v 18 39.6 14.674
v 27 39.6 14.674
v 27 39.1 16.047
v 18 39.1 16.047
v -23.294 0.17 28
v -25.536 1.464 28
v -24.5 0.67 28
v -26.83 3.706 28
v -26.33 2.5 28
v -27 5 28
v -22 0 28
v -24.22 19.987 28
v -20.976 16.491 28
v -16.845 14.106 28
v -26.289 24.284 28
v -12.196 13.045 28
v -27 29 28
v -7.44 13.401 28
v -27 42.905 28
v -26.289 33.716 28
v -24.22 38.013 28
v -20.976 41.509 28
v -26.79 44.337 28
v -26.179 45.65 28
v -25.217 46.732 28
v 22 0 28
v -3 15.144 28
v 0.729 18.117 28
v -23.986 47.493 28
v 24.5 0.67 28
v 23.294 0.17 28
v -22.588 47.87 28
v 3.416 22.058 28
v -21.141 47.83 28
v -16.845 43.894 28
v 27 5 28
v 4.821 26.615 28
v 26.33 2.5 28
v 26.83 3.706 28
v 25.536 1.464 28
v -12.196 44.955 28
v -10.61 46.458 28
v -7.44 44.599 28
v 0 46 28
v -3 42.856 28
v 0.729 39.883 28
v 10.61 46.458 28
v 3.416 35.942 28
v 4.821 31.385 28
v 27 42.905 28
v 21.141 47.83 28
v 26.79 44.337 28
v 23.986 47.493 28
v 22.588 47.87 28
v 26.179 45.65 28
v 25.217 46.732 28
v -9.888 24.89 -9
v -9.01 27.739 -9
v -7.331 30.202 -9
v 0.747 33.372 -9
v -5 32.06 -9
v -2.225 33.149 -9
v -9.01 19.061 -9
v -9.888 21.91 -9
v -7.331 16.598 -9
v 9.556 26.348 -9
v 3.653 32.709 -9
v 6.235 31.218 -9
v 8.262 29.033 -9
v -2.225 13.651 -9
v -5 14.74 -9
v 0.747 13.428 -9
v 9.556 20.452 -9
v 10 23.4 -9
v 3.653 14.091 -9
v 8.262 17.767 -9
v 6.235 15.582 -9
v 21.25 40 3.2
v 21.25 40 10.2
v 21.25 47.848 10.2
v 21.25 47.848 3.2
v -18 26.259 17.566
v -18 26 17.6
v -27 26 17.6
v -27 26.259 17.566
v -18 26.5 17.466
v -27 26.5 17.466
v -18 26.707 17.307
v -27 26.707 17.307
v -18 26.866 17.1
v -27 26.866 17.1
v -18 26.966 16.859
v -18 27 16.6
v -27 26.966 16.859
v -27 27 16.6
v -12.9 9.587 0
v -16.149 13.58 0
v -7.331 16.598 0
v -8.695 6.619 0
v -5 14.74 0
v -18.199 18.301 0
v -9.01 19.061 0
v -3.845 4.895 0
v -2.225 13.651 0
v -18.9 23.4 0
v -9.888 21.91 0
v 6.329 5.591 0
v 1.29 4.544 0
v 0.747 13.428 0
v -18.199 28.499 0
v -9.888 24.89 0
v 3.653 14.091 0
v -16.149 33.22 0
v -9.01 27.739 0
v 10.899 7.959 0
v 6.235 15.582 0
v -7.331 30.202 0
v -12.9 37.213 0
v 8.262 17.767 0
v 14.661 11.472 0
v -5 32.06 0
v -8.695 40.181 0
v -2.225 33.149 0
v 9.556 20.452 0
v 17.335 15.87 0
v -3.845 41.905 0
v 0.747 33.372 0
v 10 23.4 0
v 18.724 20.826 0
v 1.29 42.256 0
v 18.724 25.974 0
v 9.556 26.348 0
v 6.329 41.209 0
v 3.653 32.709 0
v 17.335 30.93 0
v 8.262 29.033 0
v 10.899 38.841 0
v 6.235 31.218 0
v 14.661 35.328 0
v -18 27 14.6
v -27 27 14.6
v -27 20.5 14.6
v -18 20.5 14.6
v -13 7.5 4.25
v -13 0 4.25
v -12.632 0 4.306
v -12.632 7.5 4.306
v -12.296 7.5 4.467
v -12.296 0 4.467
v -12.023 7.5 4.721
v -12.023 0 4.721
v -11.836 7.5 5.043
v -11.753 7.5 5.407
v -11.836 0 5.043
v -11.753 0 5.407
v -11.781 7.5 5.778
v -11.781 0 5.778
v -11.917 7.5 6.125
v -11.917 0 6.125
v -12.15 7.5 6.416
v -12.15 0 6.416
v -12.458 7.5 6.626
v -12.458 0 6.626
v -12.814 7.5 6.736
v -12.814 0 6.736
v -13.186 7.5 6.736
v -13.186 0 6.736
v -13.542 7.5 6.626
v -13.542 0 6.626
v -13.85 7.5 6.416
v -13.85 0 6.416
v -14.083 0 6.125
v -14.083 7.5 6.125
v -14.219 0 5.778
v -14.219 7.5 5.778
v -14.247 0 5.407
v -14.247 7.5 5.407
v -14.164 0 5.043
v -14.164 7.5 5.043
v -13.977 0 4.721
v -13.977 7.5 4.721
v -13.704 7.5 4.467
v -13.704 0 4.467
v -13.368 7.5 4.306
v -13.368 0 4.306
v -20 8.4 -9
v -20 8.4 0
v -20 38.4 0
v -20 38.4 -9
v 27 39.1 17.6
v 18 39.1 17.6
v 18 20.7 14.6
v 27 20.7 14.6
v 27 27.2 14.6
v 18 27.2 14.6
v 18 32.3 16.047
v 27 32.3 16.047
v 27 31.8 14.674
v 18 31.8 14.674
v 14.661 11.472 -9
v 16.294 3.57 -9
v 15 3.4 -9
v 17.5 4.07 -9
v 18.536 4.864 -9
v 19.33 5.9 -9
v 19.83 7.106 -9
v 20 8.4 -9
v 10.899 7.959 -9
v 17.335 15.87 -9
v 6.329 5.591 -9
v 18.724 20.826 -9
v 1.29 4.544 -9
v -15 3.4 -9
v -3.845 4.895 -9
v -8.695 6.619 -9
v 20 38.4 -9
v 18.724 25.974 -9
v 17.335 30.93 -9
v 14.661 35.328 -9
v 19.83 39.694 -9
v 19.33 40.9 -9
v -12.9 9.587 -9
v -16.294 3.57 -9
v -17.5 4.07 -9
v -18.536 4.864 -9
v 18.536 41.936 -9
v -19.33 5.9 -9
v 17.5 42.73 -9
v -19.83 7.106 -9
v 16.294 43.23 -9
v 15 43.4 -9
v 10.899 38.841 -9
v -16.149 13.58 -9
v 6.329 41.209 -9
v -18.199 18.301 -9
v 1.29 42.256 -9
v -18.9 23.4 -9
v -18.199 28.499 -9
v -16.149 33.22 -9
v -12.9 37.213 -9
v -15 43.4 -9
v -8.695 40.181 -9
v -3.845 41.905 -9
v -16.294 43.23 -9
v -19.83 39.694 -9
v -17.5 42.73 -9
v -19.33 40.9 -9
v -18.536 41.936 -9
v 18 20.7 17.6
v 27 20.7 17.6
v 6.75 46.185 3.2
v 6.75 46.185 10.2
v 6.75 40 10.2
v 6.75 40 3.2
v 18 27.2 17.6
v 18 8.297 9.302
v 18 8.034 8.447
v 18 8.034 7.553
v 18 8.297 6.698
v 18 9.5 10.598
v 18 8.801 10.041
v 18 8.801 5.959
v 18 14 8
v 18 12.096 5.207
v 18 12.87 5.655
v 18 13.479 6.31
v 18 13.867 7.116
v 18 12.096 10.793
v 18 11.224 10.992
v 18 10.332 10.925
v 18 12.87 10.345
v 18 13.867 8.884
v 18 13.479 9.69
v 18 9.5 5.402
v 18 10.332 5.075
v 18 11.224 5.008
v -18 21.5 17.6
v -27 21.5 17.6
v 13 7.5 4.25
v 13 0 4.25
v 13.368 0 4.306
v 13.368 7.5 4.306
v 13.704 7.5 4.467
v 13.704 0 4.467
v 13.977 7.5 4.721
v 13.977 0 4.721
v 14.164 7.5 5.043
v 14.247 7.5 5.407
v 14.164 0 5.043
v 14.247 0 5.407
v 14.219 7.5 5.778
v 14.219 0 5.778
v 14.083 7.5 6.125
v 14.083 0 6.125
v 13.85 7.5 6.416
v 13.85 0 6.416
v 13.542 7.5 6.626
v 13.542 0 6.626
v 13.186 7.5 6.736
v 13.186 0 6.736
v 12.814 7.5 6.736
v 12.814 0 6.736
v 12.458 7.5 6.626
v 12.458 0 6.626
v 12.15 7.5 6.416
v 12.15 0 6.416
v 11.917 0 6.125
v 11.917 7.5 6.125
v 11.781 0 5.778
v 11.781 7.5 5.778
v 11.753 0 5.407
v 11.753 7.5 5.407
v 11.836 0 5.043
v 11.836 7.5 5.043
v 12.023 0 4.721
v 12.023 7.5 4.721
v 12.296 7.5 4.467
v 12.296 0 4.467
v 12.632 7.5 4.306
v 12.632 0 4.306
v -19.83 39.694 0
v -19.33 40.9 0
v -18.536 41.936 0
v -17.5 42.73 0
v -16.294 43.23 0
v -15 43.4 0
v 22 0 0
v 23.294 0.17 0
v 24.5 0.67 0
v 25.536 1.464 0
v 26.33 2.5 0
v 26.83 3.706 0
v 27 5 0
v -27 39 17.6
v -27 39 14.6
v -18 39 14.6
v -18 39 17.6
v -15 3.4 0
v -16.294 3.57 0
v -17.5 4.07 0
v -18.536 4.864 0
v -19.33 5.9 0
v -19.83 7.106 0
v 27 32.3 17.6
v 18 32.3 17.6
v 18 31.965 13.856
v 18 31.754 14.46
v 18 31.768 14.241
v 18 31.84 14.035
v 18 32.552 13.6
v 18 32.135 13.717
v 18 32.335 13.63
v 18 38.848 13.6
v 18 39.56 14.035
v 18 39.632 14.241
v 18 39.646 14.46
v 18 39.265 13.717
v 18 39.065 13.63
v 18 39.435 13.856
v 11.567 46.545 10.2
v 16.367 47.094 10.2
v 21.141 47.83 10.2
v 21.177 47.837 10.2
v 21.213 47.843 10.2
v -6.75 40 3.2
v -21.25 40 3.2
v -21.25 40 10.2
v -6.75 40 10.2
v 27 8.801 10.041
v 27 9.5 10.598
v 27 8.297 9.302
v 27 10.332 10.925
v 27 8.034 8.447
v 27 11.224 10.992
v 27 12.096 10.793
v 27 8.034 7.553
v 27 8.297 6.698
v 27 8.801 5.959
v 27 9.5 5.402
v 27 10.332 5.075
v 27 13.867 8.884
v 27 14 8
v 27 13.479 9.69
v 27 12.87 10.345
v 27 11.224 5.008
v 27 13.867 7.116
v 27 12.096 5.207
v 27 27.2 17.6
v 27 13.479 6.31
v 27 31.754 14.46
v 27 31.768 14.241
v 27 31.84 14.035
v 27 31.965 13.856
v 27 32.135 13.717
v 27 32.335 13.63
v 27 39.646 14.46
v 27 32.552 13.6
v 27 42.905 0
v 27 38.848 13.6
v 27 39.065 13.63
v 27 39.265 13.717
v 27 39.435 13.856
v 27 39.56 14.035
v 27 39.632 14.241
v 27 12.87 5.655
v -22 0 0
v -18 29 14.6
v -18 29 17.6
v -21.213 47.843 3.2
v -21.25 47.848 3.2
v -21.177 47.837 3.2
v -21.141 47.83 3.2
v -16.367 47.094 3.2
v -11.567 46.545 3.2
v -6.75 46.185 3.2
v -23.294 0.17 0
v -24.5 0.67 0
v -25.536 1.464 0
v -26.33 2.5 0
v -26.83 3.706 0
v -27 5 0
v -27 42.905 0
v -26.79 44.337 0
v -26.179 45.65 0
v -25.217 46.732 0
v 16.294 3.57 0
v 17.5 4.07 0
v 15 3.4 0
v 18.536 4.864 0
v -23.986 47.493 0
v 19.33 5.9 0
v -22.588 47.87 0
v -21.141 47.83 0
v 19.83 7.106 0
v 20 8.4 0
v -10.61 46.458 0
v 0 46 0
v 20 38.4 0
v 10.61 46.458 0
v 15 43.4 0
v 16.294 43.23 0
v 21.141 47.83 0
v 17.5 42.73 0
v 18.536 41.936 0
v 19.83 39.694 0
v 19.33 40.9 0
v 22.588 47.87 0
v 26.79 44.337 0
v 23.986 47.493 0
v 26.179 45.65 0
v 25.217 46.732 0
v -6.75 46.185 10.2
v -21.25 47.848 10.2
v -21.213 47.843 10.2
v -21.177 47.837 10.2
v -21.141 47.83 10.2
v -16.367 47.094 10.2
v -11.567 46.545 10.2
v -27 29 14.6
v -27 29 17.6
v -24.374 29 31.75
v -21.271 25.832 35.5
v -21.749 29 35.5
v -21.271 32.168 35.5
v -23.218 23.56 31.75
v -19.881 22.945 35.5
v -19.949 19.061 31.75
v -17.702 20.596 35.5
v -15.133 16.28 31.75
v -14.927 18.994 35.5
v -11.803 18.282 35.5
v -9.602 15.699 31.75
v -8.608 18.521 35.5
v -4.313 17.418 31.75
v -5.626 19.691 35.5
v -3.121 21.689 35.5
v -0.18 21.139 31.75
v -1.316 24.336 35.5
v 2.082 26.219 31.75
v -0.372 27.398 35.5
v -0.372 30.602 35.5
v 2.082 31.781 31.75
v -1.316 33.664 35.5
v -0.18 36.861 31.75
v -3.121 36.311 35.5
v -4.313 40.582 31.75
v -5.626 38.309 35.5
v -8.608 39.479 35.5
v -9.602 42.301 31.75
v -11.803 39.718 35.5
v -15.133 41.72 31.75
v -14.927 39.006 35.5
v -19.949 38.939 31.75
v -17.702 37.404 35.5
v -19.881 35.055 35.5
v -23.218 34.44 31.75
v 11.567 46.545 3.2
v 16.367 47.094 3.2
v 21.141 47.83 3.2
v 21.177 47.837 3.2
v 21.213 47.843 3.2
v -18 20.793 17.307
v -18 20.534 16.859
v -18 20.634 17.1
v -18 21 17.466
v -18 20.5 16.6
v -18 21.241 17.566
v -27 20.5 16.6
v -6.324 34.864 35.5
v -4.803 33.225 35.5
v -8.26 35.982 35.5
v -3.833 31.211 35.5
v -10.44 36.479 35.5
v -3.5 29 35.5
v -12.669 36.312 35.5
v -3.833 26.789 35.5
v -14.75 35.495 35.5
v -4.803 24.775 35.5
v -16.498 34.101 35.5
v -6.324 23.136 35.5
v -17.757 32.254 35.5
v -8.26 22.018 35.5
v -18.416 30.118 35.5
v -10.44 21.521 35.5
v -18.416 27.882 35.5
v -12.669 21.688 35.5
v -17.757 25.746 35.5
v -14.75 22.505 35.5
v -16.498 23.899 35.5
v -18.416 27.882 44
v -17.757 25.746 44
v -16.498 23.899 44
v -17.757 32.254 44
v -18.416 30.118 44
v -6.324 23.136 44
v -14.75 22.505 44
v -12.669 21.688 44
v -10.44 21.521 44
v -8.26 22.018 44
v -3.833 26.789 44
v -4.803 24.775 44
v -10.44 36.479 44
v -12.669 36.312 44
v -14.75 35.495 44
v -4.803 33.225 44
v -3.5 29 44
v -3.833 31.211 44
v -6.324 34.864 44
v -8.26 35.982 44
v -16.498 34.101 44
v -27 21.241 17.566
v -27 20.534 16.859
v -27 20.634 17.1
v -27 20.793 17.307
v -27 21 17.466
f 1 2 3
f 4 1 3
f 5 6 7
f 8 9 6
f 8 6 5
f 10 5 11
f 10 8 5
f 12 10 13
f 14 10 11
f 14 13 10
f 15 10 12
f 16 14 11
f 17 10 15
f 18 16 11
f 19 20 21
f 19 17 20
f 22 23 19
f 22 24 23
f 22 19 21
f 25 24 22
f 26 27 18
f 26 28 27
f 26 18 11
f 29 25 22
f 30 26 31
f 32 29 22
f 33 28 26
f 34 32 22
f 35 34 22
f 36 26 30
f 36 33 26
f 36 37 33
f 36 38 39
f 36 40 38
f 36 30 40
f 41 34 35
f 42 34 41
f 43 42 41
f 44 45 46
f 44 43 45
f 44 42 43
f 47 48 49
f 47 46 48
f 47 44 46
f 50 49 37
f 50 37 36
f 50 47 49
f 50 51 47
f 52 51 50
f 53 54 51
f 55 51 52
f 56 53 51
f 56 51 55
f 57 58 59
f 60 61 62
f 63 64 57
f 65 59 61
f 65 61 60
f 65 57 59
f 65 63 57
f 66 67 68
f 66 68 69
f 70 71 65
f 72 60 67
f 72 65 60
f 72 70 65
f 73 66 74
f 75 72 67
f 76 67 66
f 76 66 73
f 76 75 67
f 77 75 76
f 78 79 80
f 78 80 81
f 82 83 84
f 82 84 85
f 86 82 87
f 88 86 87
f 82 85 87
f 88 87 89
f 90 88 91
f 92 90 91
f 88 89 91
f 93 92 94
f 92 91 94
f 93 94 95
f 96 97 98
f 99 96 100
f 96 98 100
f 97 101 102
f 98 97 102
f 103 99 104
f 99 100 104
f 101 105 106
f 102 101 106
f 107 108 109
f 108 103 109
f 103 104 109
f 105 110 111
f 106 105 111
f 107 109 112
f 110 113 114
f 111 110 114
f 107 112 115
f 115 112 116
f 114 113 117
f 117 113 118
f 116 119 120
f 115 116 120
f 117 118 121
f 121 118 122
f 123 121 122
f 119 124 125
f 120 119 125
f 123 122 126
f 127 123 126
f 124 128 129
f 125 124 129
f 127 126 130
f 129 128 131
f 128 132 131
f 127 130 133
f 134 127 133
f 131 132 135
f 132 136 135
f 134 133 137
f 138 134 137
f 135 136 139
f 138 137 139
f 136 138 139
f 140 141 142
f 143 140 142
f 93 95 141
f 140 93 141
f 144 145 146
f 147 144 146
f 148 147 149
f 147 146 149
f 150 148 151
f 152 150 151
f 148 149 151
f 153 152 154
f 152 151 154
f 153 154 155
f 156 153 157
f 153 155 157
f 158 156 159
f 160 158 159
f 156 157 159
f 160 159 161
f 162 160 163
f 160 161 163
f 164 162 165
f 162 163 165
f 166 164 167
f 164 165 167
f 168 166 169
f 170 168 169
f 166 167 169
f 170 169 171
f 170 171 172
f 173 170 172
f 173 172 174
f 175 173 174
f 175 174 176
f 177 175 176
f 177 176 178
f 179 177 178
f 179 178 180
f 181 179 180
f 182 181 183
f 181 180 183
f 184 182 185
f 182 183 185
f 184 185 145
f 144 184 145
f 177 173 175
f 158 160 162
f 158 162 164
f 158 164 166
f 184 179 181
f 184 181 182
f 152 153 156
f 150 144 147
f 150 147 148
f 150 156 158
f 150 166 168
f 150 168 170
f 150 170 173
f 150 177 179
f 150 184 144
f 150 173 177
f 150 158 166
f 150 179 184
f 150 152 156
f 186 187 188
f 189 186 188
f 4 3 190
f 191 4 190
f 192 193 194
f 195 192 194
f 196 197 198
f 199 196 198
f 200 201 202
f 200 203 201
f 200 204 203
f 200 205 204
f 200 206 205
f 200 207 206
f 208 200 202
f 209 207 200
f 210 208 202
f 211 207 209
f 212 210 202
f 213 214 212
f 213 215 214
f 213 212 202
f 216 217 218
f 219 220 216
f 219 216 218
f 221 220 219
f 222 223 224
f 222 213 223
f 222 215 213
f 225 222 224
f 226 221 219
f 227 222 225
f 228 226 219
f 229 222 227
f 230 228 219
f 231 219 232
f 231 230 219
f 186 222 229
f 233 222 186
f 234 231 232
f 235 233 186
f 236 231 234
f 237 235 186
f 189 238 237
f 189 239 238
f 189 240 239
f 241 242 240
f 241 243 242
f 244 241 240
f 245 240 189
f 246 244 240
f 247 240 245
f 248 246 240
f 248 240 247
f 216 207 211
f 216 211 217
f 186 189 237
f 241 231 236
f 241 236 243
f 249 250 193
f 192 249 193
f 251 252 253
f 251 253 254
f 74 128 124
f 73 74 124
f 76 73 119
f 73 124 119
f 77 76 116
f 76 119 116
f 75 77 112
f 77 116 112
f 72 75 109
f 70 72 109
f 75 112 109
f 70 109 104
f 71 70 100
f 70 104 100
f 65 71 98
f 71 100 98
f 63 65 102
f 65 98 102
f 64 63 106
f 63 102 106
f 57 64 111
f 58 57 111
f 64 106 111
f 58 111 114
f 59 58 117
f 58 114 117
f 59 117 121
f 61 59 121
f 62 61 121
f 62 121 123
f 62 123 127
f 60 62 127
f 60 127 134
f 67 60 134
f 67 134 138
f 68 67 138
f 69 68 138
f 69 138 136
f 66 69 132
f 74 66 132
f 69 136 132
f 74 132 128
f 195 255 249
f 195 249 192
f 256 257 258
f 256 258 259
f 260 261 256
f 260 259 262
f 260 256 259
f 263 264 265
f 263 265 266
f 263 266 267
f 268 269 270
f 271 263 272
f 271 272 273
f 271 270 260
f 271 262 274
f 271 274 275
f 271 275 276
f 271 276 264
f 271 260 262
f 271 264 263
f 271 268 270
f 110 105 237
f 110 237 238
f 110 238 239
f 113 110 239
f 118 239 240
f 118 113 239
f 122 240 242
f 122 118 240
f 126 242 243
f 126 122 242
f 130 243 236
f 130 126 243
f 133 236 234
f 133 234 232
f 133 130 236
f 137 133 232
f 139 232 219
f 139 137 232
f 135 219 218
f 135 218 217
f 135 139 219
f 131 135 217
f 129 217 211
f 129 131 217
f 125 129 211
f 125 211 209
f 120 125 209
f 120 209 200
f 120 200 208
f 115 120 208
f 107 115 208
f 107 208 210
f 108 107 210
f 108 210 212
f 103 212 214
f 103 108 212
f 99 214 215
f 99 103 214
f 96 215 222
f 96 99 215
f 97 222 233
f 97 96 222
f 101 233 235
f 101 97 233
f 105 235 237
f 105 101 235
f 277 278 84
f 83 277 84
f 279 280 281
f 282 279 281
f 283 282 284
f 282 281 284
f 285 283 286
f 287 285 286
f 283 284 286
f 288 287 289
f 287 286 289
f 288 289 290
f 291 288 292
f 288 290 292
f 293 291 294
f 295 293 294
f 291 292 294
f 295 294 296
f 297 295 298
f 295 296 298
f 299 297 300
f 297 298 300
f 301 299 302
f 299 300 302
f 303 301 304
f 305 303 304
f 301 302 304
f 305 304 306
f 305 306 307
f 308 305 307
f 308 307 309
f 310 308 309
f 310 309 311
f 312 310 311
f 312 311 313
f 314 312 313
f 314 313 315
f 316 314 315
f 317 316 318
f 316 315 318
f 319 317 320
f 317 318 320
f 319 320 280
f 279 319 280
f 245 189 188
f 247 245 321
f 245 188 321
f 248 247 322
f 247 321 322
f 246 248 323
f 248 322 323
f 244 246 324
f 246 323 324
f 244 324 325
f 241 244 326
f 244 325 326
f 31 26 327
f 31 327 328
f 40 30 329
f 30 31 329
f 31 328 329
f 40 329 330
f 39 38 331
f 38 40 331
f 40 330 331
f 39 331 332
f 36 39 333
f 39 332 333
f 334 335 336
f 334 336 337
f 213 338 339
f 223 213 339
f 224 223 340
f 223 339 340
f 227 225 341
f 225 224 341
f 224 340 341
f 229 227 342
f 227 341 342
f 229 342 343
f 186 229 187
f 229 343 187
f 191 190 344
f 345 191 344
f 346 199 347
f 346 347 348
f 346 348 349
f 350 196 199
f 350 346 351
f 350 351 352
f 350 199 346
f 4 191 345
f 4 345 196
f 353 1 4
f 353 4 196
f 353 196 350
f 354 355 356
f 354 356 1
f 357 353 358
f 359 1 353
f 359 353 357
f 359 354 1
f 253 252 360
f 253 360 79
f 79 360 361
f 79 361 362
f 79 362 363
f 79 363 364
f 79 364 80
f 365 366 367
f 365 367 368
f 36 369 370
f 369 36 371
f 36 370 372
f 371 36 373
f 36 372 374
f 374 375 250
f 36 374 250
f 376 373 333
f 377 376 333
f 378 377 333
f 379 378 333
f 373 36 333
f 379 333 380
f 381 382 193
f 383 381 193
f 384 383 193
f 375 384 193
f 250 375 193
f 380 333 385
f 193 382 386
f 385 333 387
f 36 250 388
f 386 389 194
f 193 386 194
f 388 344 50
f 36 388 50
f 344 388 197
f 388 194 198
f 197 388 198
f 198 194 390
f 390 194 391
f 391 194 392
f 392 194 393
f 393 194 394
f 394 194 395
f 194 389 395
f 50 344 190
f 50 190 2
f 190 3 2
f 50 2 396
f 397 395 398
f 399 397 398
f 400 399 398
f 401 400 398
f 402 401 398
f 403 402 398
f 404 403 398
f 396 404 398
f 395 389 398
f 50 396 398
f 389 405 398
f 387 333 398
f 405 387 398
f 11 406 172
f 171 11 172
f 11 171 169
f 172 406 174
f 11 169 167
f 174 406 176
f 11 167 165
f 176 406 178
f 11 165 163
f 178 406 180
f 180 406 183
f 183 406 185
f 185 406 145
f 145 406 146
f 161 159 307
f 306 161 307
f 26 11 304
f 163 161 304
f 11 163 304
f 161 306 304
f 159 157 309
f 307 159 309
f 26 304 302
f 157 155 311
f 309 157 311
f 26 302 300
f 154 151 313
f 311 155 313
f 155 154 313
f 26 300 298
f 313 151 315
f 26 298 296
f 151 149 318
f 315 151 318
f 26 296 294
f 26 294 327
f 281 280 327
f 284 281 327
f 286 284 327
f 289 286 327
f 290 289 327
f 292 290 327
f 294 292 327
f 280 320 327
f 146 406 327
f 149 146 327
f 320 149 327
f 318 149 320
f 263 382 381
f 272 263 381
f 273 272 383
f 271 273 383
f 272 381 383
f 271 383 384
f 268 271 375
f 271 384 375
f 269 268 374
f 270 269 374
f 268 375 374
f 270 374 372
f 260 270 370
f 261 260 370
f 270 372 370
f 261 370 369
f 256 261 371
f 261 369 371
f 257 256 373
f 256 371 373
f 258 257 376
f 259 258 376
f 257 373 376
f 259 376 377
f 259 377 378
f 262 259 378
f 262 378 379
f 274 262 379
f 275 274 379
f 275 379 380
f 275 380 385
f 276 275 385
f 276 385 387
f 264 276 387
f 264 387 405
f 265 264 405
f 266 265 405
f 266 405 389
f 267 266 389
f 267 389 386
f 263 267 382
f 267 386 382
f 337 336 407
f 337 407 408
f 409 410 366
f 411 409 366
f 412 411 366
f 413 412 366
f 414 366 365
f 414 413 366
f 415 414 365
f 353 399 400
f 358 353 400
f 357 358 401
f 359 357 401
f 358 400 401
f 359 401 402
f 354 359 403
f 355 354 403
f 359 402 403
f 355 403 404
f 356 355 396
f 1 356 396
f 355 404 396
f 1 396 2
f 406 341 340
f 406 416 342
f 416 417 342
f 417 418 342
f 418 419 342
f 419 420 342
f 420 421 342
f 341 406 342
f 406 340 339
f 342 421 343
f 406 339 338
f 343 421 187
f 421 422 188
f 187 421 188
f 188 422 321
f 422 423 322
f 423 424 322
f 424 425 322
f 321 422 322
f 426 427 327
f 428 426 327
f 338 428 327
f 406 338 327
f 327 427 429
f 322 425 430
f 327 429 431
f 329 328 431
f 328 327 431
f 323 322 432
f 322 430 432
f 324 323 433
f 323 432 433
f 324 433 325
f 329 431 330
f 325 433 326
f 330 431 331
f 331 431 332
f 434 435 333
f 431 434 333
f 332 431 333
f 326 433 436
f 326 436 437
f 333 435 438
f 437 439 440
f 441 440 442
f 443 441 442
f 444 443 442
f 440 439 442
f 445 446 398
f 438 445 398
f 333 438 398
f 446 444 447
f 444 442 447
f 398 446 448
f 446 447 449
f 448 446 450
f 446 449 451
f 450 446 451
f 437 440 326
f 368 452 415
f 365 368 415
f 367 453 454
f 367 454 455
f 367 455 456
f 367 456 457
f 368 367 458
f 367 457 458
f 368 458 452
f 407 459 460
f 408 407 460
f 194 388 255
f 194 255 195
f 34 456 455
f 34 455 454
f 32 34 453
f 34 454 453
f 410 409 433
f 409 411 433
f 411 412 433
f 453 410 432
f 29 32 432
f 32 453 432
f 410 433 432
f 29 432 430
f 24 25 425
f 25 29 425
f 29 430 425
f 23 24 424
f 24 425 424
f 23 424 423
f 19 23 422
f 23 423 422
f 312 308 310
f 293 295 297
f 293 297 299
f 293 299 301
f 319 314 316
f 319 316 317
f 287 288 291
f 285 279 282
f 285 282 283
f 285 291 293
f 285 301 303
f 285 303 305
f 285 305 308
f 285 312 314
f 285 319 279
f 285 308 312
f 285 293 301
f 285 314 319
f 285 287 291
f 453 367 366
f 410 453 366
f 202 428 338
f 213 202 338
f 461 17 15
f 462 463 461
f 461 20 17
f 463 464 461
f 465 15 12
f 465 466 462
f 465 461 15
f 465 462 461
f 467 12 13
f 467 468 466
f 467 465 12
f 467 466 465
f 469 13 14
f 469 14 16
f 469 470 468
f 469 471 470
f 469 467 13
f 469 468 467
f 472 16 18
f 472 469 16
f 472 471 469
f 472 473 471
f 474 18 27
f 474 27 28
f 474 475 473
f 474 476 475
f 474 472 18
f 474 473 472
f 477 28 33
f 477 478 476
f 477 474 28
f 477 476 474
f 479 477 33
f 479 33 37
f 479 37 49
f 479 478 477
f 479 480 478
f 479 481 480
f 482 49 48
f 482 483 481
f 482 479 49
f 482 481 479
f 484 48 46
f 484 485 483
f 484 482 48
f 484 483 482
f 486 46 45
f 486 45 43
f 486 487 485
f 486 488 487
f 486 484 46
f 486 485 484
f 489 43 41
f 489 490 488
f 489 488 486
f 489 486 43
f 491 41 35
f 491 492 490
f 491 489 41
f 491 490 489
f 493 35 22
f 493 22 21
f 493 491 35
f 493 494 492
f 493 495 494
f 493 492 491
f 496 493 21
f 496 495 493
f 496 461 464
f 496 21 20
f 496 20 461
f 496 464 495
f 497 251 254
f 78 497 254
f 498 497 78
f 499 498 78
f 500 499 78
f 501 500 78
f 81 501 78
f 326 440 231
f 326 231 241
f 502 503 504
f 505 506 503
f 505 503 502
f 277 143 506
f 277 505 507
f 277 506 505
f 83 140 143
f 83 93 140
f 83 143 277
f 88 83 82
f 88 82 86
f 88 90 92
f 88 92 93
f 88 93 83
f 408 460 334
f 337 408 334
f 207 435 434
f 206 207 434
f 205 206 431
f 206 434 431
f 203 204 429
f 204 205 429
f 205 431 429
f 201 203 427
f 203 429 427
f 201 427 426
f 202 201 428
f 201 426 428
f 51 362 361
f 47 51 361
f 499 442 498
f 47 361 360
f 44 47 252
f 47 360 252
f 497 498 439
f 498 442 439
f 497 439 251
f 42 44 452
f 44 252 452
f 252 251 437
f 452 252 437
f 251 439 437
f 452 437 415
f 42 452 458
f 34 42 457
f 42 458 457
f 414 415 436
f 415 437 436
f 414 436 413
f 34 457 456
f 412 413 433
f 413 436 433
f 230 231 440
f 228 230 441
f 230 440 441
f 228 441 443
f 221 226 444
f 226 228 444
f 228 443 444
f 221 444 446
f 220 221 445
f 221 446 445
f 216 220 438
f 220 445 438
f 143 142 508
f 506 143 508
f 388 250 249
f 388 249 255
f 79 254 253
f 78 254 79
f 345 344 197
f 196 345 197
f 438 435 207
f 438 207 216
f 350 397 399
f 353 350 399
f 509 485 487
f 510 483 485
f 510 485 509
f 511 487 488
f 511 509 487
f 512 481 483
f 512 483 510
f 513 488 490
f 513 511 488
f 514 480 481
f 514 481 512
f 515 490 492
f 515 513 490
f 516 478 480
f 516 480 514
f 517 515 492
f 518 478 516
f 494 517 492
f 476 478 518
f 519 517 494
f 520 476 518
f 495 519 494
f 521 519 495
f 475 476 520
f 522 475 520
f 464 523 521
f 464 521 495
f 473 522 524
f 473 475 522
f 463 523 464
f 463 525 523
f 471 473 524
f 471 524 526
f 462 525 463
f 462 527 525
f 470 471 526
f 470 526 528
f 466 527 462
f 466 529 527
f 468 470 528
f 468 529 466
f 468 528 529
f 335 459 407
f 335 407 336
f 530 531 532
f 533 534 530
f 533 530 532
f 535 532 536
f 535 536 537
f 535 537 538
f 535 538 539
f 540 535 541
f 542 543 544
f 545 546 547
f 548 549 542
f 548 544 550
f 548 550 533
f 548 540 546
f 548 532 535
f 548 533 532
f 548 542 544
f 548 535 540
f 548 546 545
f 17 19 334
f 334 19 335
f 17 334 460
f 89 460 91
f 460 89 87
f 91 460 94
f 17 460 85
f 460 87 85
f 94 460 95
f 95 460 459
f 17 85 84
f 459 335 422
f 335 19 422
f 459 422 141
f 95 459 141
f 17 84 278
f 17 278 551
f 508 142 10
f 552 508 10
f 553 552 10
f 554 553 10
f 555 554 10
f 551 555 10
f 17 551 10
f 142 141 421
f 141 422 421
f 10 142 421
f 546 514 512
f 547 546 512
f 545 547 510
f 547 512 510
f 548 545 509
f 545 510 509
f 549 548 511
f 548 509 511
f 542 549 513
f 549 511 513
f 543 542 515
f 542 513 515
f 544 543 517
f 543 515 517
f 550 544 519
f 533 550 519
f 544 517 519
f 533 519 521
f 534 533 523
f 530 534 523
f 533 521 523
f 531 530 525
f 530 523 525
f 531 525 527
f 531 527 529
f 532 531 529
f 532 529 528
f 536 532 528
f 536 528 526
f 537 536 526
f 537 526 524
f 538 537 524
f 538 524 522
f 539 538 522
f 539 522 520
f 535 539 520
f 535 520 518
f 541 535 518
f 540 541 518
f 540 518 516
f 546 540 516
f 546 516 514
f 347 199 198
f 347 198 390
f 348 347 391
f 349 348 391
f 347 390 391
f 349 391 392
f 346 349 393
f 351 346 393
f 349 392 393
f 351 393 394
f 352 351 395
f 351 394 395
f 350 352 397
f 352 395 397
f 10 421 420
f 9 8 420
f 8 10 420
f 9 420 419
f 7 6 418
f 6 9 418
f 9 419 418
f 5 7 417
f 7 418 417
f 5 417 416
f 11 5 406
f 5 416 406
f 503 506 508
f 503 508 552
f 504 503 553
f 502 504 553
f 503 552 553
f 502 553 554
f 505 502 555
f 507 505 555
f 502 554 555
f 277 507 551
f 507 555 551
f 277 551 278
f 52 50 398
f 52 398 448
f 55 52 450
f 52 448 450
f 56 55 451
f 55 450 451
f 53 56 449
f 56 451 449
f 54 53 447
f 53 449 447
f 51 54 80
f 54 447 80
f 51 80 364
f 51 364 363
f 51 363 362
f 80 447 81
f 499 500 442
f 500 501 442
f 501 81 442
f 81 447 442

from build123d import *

# Parameters (mm, degrees)
BOSS_EXTRU_1_DEPTH      = 28
ESQUISSE2_R             = 7.5
BOSS_EXTRU_2_DEPTH      = 16
ESQUISSE3_R             = 16
BOSS_EXTRU_3_DEPTH      = 7.5
CHANFREIN2_SIZE2        = 5.251556537
CHANFREIN2_SIZE         = 7.5
ESQUISSE4_R             = 1.25
ENL_V_MAT_EXTRU_1_DEPTH = 7.5
ESQUISSE5_W             = 40
ESQUISSE5_H             = 40
ESQUISSE5_R             = 18.9
ESQUISSE5_R_2           = 10
BOSS_EXTRU_4_DEPTH      = 9
ESQUISSE7_W             = 14.5
ESQUISSE7_H             = 7
ENL_V_MAT_EXTRU_2_DEPTH = 9
ESQUISSE8_W             = 3
ESQUISSE8_H             = 10
ENL_V_MAT_EXTRU_3_DEPTH = 9
ESQUISSE9_R             = 3
ESQUISSE9_W             = 3
ESQUISSE9_H             = 6.5
ENL_V_MAT_EXTRU_4_DEPTH = 9
CONG_2_R                = 5


# Some blends are built 0.0001 mm under size
with BuildPart() as part:
    # Esquisse1 → Boss.-Extru.1 (new body)
    with BuildSketch(Plane.XY):
        with BuildLine():
            Line((-27, 0), (27, 0))
            Line((27, 0), (27, 49))
            ThreePointArc((27, 49), (0, 46), (-27, 49))
            Line((-27, 49), (-27, 0))
        make_face()
    extrude(amount=BOSS_EXTRU_1_DEPTH)

    # Esquisse2 → Boss.-Extru.2 (add)
    with BuildSketch(Plane.XY.offset(28)):
        with Locations((-11, 29)):
            Circle(ESQUISSE2_R)
    extrude(amount=BOSS_EXTRU_2_DEPTH)

    # Esquisse3 → Boss.-Extru.3 (add)
    with BuildSketch(Plane.XY.offset(28)):
        with Locations(Location((-11, 29, 0), (0, 0, 180))):
            Circle(ESQUISSE3_R)
    extrude(amount=BOSS_EXTRU_3_DEPTH)

    # Chanfrein2
    chanfrein2_edges = [part.edges().sort_by_distance(p)[0] for p in [
        (5, 29, 35.5),
    ]]
    chanfrein2_side = [part.faces().sort_by_distance(p)[0] for p in [
        (5, 29, 35.394968869),
    ]]
    chamfer(chanfrein2_edges, length=CHANFREIN2_SIZE - 0.0001, length2=CHANFREIN2_SIZE2 - 0.0001, reference=chanfrein2_side[0])  # a hair under: the kernel refuses the full size

    # Esquisse4 → Enlèv. mat.-Extru.1 (cut)
    with BuildSketch(Plane.XZ):
        with Locations(Location((-13, 5.5, 0), (0, 0, 270))):
            Circle(ESQUISSE4_R)
        with Locations(Location((13, 5.5, 0), (0, 0, 270))):
            Circle(ESQUISSE4_R)
    extrude(amount=-ENL_V_MAT_EXTRU_1_DEPTH, mode=Mode.SUBTRACT)

    # Esquisse5 → Boss.-Extru.4 (add)
    # profile 1 of 2: a face of its own
    with BuildSketch(Plane(origin=(0, 0, 0), x_dir=(-1, 0, 0), z_dir=(0, 0, -1))):
        with Locations((0, 23.4)):
            Rectangle(ESQUISSE5_W, ESQUISSE5_H)
        with Locations((0, 23.4)):
            Circle(ESQUISSE5_R, mode=Mode.SUBTRACT)
    # profile 2 of 2: a face of its own
    with BuildSketch(Plane(origin=(0, 0, 0), x_dir=(-1, 0, 0), z_dir=(0, 0, -1))):
        with Locations(Location((0, 23.4, 0), (0, 0, 180))):
            Circle(ESQUISSE5_R_2)
    extrude(amount=BOSS_EXTRU_4_DEPTH)

    # Esquisse7 → Enlèv. mat.-Extru.2 (cut)
    with BuildSketch(Plane(origin=(0, 49, 0), x_dir=(1, 0, 0), z_dir=(0, 1, 0))):
        with Locations((-14, -6.7)):
            Rectangle(ESQUISSE7_W, ESQUISSE7_H)
        with Locations((14, -6.7)):
            Rectangle(ESQUISSE7_W, ESQUISSE7_H)
    extrude(amount=-ENL_V_MAT_EXTRU_2_DEPTH, mode=Mode.SUBTRACT)

    # Esquisse8 → Enlèv. mat.-Extru.3 (cut)
    with BuildSketch(Plane.ZY.offset(27)):
        with BuildLine():
            Line((14.6, 27), (14.6, 20.5))
            Line((14.6, 20.5), (16.6, 20.5))
            ThreePointArc((16.6, 20.5), (17.307106781, 20.792893219), (17.6, 21.5))
            Line((17.6, 21.5), (17.6, 26))
            ThreePointArc((17.6, 26), (17.307106781, 26.707106781), (16.6, 27))
            Line((16.6, 27), (14.6, 27))
        make_face()
        with Locations((16.1, 34)):
            Rectangle(ESQUISSE8_W, ESQUISSE8_H)
    extrude(amount=-ENL_V_MAT_EXTRU_3_DEPTH, mode=Mode.SUBTRACT)

    # Esquisse9 → Enlèv. mat.-Extru.4 (cut)
    with BuildSketch(Plane(origin=(27, 0, 0), x_dir=(0, 0, -1), z_dir=(1, 0, 0))):
        with Locations(Location((-8, 11, 0), (0, 0, 90))):
            Circle(ESQUISSE9_R)
        with BuildLine():
            Line((-17.6, 39.1), (-17.6, 32.3))
            Line((-17.6, 32.3), (-16.047354824, 32.3))
            Line((-16.047354824, 32.3), (-14.673616115, 31.8))
            ThreePointArc((-14.673616115, 31.8), (-13.941138851, 31.896432461), (-13.6, 32.551754097))
            Line((-13.6, 32.551754097), (-13.6, 38.848245903))
            ThreePointArc((-13.6, 38.848245903), (-13.941138851, 39.503567539), (-14.673616115, 39.6))
            Line((-14.673616115, 39.6), (-16.047354824, 39.1))
            Line((-16.047354824, 39.1), (-17.6, 39.1))
        make_face()
        with Locations((-16.1, 23.95)):
            Rectangle(ESQUISSE9_W, ESQUISSE9_H)
    extrude(amount=-ENL_V_MAT_EXTRU_4_DEPTH, mode=Mode.SUBTRACT)

    # Congé2
    # the kernel refuses this fillet: 5 mm, written as the material it takes off along each edge
    with BuildSketch(Plane(origin=(20, 3.4, 0), x_dir=(-1, 0, 0), z_dir=(0, 0, -1)), Plane(origin=(-20, 3.4, 0), x_dir=(0, 1, 0), z_dir=(0, 0, -1)), Plane(origin=(20, 43.4, 0), x_dir=(0, -1, 0), z_dir=(0, 0, -1))) as cong_2_piece_1:
        with BuildLine():
            CenterArc((CONG_2_R, CONG_2_R), CONG_2_R, 180, 90)
            Line((0, CONG_2_R), (0, 0))
            Line((0, 0), (CONG_2_R, 0))
        make_face()
    extrude(amount=21.5, mode=Mode.SUBTRACT)
    with BuildSketch(Plane(origin=(-20, 43.4, 0), x_dir=(0, -1, 0), z_dir=(0, 0, -1))) as cong_2_piece_2:
        with BuildLine():
            CenterArc((CONG_2_R, -CONG_2_R), CONG_2_R, 90, 90)
            Line((0, -CONG_2_R), (0, 0))
            Line((0, 0), (CONG_2_R, 0))
        make_face()
    extrude(amount=21.5, mode=Mode.SUBTRACT)
    with BuildSketch(Plane(origin=(-27, 49, -15.238005323), x_dir=(0.9806535629636468, -0.19575134596396773, 0), z_dir=(0, 0, 1))) as cong_2_piece_3:
        with BuildLine():
            CenterArc((6.096411836, -4.998524955), CONG_2_R, 91.391765025, 99.896853443)
            Line((1.193144021, -5.977281685), (0, 0))
            ThreePointArc((0, 0), (2.987484684, -0.036286103), (5.974969369, 0))
        make_face()
    extrude(amount=58.476010646, mode=Mode.SUBTRACT)
    with BuildSketch(Plane(origin=(-27, 0, -12.5), x_dir=(1, 0, 0), z_dir=(0, 0, 1)), Plane(origin=(27, 0, -12.5), x_dir=(0, 1, 0), z_dir=(0, 0, 1))) as cong_2_piece_4:
        with BuildLine():
            CenterArc((CONG_2_R, CONG_2_R), CONG_2_R, 180, 90)
            Line((0, CONG_2_R), (0, 0))
            Line((0, 0), (CONG_2_R, 0))
        make_face()
    extrude(amount=53, mode=Mode.SUBTRACT)
    with BuildSketch(Plane(origin=(27, 49, -15.238005323), x_dir=(-0.9806535629636471, -0.19575134596396557, 0), z_dir=(0, 0, 1))) as cong_2_piece_5:
        with BuildLine():
            CenterArc((6.096411836, 4.998524955), CONG_2_R, 168.711381533, 99.896853443)
            Line((1.193144021, 5.977281685), (0, 0))
            ThreePointArc((0, 0), (2.987484684, 0.036286103), (5.974969369, 0))
        make_face()
    extrude(amount=58.476010646, mode=Mode.SUBTRACT)


solid = part.part
